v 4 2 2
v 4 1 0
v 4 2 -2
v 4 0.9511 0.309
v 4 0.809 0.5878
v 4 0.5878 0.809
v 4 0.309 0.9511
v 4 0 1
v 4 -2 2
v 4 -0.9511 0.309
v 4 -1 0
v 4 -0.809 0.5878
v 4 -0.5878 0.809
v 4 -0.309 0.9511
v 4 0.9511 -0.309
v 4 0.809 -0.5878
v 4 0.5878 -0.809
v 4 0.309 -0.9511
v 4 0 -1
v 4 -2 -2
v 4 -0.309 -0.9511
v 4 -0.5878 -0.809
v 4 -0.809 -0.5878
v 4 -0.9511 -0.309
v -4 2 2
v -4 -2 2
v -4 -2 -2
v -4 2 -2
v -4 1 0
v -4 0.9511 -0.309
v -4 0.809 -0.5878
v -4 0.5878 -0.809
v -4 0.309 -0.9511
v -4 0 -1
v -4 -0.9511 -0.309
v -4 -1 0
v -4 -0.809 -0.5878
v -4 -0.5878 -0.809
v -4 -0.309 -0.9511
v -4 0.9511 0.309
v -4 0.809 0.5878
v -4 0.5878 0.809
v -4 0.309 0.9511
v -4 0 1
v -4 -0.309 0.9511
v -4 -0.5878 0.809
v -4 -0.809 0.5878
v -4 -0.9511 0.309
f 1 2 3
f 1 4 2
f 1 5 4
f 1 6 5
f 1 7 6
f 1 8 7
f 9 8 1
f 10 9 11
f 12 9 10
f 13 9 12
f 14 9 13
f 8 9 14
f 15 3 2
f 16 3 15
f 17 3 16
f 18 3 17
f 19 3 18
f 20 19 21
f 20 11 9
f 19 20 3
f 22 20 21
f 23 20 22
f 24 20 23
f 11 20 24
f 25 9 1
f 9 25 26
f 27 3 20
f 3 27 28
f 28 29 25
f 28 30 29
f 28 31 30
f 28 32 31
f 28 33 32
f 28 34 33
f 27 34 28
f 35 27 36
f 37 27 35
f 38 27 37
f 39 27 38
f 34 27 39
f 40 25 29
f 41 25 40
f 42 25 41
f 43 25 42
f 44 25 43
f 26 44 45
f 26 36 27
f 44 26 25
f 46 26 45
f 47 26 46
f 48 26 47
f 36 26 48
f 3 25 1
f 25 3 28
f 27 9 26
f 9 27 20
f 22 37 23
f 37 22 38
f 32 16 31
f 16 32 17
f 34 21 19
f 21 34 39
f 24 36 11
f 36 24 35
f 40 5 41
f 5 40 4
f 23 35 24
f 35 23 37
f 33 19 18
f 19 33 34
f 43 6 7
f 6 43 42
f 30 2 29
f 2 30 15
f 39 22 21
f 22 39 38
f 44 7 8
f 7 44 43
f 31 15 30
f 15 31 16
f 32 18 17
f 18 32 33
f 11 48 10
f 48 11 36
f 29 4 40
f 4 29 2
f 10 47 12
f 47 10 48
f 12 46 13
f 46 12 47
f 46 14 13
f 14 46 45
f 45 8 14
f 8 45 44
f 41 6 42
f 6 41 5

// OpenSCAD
dx= 21.5 - 3.3;
dy = 73 - 35.5;
height = 15;

reset_insert();

//reset_block();

module reset_block()
{
	difference()
	{
		union()
		{
			column();
			translate([dx, dy, 0])
				column();
			translate([-7.5/2,-7.5/2,-height/2])
				cube([dx+7.5,dy+7.5,3]);
		}
		column_hole();
		translate([dx, dy, 0])
			column_hole();
		translate([dx-2, 2, 0])
			cylinder(r=1.7, h=2*height,center=true,$fn=20);
		translate([2, dy - 2, 0])
			cylinder(r=1.7, h=2*height,center=true,$fn=20);
	}
}

module column()
{
	cube([7.5,7.5,height],center=true);
}

module column_hole()
{
	union()
	{
		translate([0,0,-5])
		{
			cube([4.5,4.5,height],center=true);
			translate([0,0,height/2])
				pyramid_45(4.5);
		}
		cylinder(r=1, h=2*height,center=true,$fn=20);
	}
}

module reset_insert()
{
	difference()
	{
		cube([height-7,4,4],center=true);
		rotate([0,90,0])
			cylinder(r=1,h=2*height,center=true,$fn=20);
	}
}


module pyramid_45(side=5)
{
polyhedron(
  points=[ [side/2,side/2,0],[side/2,-side/2,0],[-side/2,-side/2,0],
		[-side/2,side/2,0], [0,0,side/sqrt(2)]  ],
  triangles=[ [0,1,4],[1,2,4],[2,3,4],[3,0,4], 
              [1,0,3],[2,1,3] ] 
 );
}
